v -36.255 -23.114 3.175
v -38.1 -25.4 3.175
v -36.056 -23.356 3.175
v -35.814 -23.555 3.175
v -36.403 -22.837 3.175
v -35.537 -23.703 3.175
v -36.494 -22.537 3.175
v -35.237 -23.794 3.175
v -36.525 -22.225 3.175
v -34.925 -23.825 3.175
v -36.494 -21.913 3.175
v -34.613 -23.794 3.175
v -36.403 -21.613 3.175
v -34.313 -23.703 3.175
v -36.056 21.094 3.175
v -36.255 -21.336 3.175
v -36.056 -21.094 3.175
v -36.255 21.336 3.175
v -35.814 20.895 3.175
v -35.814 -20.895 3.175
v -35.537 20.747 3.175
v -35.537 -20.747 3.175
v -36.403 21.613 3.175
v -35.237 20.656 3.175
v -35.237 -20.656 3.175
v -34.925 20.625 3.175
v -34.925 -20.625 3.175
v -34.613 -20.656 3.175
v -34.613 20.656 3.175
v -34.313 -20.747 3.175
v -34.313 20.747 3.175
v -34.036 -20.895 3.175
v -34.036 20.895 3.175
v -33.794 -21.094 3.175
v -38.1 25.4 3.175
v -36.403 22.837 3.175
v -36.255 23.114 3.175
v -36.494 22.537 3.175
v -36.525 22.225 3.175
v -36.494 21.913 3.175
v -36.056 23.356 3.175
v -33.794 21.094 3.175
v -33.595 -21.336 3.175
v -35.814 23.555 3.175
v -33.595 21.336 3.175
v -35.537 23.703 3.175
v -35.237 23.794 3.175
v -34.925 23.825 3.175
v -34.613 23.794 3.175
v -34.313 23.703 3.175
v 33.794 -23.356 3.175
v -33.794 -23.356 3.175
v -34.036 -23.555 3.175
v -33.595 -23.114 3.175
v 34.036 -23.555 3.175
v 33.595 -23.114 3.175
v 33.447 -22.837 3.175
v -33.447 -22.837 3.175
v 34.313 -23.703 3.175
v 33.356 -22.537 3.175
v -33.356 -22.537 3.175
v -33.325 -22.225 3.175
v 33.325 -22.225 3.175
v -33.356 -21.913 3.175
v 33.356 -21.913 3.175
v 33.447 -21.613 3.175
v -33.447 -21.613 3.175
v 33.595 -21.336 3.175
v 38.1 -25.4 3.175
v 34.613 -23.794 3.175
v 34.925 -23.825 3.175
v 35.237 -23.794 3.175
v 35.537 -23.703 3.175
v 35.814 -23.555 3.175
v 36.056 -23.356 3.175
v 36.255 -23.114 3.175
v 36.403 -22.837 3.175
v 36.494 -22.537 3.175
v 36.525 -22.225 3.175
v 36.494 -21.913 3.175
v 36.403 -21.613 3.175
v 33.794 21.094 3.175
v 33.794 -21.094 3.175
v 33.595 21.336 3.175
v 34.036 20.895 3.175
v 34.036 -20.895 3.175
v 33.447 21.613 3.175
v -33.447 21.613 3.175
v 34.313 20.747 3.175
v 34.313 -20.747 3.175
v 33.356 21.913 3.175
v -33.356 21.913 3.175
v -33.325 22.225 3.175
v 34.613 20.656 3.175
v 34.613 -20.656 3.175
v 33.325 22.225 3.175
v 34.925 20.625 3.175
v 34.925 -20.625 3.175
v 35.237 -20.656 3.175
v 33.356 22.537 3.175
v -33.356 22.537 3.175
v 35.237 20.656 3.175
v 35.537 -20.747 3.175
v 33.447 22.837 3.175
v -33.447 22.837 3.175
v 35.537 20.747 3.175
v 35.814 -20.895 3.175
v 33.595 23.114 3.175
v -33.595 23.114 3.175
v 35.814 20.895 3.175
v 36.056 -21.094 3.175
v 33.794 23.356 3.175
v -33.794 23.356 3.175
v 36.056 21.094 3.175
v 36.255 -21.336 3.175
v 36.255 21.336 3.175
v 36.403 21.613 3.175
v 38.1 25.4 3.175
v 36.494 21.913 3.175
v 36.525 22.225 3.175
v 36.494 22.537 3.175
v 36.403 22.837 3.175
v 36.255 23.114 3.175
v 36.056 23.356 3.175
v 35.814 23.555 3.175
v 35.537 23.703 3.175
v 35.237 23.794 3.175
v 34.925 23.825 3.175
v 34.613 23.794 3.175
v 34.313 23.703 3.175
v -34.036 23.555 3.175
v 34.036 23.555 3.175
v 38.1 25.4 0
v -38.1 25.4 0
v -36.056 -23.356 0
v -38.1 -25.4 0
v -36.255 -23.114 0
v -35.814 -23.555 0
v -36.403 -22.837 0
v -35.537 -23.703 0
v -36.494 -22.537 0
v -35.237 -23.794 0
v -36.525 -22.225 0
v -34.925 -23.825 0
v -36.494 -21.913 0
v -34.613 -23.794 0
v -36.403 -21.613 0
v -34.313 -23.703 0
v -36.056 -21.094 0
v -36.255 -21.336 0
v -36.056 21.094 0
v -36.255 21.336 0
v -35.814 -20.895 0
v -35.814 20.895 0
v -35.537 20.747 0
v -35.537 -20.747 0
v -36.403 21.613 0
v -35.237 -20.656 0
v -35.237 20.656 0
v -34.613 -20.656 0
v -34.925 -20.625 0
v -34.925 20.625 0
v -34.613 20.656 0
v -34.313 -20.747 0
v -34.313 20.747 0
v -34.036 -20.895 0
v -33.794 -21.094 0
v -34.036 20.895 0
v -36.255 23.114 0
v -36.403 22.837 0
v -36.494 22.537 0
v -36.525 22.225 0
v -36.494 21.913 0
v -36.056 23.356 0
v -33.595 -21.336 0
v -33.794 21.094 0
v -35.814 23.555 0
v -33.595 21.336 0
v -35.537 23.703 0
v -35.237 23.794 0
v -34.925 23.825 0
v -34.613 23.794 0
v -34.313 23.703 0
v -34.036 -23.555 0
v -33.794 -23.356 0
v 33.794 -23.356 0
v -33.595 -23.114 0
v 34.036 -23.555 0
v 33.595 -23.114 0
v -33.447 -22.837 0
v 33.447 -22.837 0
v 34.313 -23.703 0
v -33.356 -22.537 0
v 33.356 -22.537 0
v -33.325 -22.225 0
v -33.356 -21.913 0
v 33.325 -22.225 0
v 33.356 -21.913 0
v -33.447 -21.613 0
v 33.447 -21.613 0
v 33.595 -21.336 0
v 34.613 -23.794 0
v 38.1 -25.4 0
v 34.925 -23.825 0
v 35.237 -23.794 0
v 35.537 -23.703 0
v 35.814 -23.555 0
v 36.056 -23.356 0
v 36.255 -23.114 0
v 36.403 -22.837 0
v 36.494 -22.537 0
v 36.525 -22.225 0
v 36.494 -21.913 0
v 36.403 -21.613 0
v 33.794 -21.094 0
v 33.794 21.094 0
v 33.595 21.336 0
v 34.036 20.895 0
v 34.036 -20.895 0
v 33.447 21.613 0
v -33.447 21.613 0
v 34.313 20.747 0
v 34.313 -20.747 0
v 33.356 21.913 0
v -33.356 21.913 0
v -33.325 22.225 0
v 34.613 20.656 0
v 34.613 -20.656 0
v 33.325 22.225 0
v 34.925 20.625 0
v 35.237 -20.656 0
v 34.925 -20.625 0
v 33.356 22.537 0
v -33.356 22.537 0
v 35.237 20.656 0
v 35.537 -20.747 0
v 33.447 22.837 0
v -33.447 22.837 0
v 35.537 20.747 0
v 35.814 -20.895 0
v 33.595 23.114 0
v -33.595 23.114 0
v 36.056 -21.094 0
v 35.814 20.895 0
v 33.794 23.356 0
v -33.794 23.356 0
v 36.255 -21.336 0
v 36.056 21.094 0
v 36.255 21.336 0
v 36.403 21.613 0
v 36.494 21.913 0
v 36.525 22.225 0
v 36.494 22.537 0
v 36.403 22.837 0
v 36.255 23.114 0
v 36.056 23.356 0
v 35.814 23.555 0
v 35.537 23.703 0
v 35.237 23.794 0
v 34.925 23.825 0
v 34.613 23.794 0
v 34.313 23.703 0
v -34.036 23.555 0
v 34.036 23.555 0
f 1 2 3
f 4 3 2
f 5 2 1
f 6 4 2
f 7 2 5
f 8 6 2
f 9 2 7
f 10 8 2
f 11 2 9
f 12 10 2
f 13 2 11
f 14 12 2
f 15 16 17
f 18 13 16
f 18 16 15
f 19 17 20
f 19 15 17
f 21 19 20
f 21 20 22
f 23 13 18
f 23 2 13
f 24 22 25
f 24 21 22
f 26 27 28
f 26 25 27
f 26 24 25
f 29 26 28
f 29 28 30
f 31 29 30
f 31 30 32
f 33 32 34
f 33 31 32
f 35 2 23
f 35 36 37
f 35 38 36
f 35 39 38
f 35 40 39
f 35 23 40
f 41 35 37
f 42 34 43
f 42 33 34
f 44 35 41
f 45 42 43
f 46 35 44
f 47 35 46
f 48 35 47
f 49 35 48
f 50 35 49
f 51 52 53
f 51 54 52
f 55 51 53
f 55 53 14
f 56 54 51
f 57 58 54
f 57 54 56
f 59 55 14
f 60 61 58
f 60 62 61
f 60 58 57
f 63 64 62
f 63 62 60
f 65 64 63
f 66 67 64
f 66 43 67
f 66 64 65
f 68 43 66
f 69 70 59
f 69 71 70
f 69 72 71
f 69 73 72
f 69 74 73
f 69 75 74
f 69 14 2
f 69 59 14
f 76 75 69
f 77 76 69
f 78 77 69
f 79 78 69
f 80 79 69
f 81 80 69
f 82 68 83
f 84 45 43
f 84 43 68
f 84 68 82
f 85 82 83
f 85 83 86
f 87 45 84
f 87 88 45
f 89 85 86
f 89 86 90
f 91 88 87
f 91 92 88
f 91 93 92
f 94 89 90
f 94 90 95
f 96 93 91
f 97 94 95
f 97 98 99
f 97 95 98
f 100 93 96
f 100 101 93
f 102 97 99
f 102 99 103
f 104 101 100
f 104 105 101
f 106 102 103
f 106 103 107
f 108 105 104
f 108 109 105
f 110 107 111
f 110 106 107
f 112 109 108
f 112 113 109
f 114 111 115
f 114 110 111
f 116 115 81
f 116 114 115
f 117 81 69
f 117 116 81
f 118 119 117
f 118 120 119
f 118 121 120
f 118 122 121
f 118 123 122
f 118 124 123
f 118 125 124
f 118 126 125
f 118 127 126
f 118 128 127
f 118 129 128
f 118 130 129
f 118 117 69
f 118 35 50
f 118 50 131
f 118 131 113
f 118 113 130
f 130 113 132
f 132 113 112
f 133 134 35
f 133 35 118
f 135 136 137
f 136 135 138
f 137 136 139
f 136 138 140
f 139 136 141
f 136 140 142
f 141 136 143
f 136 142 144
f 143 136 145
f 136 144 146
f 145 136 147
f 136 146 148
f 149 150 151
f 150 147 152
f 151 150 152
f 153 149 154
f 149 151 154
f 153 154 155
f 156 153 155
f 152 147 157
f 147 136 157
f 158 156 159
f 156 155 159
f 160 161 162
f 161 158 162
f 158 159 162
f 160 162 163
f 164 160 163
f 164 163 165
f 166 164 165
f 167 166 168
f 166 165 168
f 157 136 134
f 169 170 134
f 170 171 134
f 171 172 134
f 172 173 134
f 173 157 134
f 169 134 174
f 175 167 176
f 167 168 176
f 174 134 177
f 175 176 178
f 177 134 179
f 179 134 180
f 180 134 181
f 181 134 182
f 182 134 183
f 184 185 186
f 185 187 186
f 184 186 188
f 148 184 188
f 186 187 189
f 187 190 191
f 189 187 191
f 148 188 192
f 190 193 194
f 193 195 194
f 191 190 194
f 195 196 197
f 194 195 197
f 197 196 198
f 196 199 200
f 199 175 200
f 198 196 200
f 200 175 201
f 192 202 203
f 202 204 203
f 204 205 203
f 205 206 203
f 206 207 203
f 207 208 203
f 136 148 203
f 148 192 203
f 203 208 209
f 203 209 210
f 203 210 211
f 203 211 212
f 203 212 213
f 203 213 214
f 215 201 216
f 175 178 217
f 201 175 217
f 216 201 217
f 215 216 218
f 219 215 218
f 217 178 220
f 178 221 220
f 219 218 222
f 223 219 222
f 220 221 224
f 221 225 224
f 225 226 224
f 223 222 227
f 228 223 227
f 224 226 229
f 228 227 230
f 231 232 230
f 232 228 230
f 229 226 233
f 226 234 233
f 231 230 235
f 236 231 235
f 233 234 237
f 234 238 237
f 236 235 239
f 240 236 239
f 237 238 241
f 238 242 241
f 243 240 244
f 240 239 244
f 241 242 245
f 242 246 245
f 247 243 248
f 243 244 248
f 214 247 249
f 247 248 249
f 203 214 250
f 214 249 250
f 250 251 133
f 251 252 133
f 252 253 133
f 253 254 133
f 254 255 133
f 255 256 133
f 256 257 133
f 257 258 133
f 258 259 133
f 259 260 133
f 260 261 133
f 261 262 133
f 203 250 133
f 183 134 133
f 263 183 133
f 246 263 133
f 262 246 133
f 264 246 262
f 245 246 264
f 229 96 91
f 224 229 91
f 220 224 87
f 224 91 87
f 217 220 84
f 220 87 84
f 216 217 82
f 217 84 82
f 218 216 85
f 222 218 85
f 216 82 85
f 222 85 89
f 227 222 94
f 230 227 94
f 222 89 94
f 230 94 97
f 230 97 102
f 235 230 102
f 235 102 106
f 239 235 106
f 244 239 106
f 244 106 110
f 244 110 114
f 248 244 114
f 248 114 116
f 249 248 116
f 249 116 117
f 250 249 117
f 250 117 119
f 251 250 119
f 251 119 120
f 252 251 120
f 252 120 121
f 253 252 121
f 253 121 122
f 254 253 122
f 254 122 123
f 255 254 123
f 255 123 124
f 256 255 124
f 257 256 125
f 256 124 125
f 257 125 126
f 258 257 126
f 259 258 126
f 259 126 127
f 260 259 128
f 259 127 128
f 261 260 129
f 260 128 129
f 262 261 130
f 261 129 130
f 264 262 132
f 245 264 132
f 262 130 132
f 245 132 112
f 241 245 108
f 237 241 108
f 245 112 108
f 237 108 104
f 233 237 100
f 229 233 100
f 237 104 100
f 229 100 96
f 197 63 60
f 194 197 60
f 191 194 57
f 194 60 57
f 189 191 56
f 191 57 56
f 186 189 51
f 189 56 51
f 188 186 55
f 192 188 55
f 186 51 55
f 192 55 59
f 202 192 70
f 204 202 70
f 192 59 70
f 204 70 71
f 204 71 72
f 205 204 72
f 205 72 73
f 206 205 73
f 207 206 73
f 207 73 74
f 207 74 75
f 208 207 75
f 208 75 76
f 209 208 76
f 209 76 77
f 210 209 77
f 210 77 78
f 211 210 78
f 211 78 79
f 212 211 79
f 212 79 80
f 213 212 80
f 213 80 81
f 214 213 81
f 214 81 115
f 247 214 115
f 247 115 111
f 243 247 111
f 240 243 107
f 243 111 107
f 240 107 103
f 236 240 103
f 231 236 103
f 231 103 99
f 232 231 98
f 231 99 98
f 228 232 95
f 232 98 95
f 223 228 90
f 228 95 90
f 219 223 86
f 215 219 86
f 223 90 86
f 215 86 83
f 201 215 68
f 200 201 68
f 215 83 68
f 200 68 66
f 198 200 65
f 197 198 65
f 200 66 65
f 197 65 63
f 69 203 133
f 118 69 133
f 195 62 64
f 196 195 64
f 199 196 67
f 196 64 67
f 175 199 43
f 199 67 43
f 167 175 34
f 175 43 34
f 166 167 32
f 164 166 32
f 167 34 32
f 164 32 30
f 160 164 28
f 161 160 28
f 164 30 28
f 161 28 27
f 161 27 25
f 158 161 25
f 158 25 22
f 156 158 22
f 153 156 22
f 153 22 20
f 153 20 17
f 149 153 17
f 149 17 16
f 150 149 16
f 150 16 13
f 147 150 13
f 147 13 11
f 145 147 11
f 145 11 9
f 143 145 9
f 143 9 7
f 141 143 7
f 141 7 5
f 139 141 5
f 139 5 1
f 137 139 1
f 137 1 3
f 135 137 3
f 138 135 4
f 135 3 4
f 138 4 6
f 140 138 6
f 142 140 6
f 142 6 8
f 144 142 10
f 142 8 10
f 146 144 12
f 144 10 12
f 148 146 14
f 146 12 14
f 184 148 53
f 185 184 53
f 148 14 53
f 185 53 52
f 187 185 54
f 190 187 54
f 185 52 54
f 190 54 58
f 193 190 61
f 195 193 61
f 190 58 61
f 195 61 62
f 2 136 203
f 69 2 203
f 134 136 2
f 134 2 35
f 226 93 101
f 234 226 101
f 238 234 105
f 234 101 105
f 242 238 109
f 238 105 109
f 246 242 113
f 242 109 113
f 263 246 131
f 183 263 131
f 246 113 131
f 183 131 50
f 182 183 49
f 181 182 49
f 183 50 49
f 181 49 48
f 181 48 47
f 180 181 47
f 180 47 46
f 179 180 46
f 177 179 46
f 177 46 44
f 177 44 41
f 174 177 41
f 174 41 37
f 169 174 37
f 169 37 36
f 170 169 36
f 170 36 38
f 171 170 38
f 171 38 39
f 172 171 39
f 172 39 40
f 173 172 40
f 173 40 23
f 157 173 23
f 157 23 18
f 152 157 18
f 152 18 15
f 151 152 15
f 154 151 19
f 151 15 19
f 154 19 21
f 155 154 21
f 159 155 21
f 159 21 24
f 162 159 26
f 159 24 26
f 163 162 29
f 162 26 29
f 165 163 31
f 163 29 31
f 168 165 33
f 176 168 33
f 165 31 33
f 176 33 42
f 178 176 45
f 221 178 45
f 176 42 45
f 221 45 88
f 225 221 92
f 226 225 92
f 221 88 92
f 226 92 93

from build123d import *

# Parameters (mm, degrees)
SKETCH1_W           = 76.2
SKETCH1_H           = 50.8
BOSS_EXTRUDE1_DEPTH = 3.175
CUT_EXTRUDE1_REACH  = 47.9
SKETCH2_R           = 1.6
SKETCH2_R_2         = 1.599999975


with BuildPart() as part:
    # Sketch1 → Boss-Extrude1 (new body)
    with BuildSketch(Plane.XY):
        Rectangle(SKETCH1_W, SKETCH1_H)
    extrude(amount=BOSS_EXTRUDE1_DEPTH)

    # Sketch2 → Cut-Extrude1 (cut, up to next)
    with BuildSketch(Plane.XY.offset(3.175), mode=Mode.PRIVATE) as cut_extrude1_sk1:
        with Locations((-34.925, 22.225)):
            Circle(SKETCH2_R)
    cut_extrude1_tool1 = extrude(cut_extrude1_sk1.sketch, amount=-CUT_EXTRUDE1_REACH, mode=Mode.PRIVATE) & part.part
    # Sketch2 → Cut-Extrude1 (cut, up to next)
    with BuildSketch(Plane.XY.offset(3.175), mode=Mode.PRIVATE) as cut_extrude1_sk2:
        with Locations((-34.925, -22.225)):
            Circle(SKETCH2_R_2)
    cut_extrude1_tool2 = extrude(cut_extrude1_sk2.sketch, amount=-CUT_EXTRUDE1_REACH, mode=Mode.PRIVATE) & part.part
    # Sketch2 → Cut-Extrude1 (cut, up to next)
    with BuildSketch(Plane.XY.offset(3.175), mode=Mode.PRIVATE) as cut_extrude1_sk3:
        with Locations(Location((34.925, -22.225, 0), (0, 0, 180))):
            Circle(SKETCH2_R_2)
    cut_extrude1_tool3 = extrude(cut_extrude1_sk3.sketch, amount=-CUT_EXTRUDE1_REACH, mode=Mode.PRIVATE) & part.part
    # Sketch2 → Cut-Extrude1 (cut, up to next)
    with BuildSketch(Plane.XY.offset(3.175), mode=Mode.PRIVATE) as cut_extrude1_sk4:
        with Locations(Location((34.925, 22.225, 0), (0, 0, 180))):
            Circle(SKETCH2_R)
    cut_extrude1_tool4 = extrude(cut_extrude1_sk4.sketch, amount=-CUT_EXTRUDE1_REACH, mode=Mode.PRIVATE) & part.part
    add(cut_extrude1_tool1.solids().sort_by_distance((-34.925, 22.225, 3.175))[0], mode=Mode.SUBTRACT)
    add(cut_extrude1_tool2.solids().sort_by_distance((-34.925, -22.225, 3.175))[0], mode=Mode.SUBTRACT)
    add(cut_extrude1_tool3.solids().sort_by_distance((34.925, -22.225, 3.175))[0], mode=Mode.SUBTRACT)
    add(cut_extrude1_tool4.solids().sort_by_distance((34.925, 22.225, 3.175))[0], mode=Mode.SUBTRACT)


solid = part.part
